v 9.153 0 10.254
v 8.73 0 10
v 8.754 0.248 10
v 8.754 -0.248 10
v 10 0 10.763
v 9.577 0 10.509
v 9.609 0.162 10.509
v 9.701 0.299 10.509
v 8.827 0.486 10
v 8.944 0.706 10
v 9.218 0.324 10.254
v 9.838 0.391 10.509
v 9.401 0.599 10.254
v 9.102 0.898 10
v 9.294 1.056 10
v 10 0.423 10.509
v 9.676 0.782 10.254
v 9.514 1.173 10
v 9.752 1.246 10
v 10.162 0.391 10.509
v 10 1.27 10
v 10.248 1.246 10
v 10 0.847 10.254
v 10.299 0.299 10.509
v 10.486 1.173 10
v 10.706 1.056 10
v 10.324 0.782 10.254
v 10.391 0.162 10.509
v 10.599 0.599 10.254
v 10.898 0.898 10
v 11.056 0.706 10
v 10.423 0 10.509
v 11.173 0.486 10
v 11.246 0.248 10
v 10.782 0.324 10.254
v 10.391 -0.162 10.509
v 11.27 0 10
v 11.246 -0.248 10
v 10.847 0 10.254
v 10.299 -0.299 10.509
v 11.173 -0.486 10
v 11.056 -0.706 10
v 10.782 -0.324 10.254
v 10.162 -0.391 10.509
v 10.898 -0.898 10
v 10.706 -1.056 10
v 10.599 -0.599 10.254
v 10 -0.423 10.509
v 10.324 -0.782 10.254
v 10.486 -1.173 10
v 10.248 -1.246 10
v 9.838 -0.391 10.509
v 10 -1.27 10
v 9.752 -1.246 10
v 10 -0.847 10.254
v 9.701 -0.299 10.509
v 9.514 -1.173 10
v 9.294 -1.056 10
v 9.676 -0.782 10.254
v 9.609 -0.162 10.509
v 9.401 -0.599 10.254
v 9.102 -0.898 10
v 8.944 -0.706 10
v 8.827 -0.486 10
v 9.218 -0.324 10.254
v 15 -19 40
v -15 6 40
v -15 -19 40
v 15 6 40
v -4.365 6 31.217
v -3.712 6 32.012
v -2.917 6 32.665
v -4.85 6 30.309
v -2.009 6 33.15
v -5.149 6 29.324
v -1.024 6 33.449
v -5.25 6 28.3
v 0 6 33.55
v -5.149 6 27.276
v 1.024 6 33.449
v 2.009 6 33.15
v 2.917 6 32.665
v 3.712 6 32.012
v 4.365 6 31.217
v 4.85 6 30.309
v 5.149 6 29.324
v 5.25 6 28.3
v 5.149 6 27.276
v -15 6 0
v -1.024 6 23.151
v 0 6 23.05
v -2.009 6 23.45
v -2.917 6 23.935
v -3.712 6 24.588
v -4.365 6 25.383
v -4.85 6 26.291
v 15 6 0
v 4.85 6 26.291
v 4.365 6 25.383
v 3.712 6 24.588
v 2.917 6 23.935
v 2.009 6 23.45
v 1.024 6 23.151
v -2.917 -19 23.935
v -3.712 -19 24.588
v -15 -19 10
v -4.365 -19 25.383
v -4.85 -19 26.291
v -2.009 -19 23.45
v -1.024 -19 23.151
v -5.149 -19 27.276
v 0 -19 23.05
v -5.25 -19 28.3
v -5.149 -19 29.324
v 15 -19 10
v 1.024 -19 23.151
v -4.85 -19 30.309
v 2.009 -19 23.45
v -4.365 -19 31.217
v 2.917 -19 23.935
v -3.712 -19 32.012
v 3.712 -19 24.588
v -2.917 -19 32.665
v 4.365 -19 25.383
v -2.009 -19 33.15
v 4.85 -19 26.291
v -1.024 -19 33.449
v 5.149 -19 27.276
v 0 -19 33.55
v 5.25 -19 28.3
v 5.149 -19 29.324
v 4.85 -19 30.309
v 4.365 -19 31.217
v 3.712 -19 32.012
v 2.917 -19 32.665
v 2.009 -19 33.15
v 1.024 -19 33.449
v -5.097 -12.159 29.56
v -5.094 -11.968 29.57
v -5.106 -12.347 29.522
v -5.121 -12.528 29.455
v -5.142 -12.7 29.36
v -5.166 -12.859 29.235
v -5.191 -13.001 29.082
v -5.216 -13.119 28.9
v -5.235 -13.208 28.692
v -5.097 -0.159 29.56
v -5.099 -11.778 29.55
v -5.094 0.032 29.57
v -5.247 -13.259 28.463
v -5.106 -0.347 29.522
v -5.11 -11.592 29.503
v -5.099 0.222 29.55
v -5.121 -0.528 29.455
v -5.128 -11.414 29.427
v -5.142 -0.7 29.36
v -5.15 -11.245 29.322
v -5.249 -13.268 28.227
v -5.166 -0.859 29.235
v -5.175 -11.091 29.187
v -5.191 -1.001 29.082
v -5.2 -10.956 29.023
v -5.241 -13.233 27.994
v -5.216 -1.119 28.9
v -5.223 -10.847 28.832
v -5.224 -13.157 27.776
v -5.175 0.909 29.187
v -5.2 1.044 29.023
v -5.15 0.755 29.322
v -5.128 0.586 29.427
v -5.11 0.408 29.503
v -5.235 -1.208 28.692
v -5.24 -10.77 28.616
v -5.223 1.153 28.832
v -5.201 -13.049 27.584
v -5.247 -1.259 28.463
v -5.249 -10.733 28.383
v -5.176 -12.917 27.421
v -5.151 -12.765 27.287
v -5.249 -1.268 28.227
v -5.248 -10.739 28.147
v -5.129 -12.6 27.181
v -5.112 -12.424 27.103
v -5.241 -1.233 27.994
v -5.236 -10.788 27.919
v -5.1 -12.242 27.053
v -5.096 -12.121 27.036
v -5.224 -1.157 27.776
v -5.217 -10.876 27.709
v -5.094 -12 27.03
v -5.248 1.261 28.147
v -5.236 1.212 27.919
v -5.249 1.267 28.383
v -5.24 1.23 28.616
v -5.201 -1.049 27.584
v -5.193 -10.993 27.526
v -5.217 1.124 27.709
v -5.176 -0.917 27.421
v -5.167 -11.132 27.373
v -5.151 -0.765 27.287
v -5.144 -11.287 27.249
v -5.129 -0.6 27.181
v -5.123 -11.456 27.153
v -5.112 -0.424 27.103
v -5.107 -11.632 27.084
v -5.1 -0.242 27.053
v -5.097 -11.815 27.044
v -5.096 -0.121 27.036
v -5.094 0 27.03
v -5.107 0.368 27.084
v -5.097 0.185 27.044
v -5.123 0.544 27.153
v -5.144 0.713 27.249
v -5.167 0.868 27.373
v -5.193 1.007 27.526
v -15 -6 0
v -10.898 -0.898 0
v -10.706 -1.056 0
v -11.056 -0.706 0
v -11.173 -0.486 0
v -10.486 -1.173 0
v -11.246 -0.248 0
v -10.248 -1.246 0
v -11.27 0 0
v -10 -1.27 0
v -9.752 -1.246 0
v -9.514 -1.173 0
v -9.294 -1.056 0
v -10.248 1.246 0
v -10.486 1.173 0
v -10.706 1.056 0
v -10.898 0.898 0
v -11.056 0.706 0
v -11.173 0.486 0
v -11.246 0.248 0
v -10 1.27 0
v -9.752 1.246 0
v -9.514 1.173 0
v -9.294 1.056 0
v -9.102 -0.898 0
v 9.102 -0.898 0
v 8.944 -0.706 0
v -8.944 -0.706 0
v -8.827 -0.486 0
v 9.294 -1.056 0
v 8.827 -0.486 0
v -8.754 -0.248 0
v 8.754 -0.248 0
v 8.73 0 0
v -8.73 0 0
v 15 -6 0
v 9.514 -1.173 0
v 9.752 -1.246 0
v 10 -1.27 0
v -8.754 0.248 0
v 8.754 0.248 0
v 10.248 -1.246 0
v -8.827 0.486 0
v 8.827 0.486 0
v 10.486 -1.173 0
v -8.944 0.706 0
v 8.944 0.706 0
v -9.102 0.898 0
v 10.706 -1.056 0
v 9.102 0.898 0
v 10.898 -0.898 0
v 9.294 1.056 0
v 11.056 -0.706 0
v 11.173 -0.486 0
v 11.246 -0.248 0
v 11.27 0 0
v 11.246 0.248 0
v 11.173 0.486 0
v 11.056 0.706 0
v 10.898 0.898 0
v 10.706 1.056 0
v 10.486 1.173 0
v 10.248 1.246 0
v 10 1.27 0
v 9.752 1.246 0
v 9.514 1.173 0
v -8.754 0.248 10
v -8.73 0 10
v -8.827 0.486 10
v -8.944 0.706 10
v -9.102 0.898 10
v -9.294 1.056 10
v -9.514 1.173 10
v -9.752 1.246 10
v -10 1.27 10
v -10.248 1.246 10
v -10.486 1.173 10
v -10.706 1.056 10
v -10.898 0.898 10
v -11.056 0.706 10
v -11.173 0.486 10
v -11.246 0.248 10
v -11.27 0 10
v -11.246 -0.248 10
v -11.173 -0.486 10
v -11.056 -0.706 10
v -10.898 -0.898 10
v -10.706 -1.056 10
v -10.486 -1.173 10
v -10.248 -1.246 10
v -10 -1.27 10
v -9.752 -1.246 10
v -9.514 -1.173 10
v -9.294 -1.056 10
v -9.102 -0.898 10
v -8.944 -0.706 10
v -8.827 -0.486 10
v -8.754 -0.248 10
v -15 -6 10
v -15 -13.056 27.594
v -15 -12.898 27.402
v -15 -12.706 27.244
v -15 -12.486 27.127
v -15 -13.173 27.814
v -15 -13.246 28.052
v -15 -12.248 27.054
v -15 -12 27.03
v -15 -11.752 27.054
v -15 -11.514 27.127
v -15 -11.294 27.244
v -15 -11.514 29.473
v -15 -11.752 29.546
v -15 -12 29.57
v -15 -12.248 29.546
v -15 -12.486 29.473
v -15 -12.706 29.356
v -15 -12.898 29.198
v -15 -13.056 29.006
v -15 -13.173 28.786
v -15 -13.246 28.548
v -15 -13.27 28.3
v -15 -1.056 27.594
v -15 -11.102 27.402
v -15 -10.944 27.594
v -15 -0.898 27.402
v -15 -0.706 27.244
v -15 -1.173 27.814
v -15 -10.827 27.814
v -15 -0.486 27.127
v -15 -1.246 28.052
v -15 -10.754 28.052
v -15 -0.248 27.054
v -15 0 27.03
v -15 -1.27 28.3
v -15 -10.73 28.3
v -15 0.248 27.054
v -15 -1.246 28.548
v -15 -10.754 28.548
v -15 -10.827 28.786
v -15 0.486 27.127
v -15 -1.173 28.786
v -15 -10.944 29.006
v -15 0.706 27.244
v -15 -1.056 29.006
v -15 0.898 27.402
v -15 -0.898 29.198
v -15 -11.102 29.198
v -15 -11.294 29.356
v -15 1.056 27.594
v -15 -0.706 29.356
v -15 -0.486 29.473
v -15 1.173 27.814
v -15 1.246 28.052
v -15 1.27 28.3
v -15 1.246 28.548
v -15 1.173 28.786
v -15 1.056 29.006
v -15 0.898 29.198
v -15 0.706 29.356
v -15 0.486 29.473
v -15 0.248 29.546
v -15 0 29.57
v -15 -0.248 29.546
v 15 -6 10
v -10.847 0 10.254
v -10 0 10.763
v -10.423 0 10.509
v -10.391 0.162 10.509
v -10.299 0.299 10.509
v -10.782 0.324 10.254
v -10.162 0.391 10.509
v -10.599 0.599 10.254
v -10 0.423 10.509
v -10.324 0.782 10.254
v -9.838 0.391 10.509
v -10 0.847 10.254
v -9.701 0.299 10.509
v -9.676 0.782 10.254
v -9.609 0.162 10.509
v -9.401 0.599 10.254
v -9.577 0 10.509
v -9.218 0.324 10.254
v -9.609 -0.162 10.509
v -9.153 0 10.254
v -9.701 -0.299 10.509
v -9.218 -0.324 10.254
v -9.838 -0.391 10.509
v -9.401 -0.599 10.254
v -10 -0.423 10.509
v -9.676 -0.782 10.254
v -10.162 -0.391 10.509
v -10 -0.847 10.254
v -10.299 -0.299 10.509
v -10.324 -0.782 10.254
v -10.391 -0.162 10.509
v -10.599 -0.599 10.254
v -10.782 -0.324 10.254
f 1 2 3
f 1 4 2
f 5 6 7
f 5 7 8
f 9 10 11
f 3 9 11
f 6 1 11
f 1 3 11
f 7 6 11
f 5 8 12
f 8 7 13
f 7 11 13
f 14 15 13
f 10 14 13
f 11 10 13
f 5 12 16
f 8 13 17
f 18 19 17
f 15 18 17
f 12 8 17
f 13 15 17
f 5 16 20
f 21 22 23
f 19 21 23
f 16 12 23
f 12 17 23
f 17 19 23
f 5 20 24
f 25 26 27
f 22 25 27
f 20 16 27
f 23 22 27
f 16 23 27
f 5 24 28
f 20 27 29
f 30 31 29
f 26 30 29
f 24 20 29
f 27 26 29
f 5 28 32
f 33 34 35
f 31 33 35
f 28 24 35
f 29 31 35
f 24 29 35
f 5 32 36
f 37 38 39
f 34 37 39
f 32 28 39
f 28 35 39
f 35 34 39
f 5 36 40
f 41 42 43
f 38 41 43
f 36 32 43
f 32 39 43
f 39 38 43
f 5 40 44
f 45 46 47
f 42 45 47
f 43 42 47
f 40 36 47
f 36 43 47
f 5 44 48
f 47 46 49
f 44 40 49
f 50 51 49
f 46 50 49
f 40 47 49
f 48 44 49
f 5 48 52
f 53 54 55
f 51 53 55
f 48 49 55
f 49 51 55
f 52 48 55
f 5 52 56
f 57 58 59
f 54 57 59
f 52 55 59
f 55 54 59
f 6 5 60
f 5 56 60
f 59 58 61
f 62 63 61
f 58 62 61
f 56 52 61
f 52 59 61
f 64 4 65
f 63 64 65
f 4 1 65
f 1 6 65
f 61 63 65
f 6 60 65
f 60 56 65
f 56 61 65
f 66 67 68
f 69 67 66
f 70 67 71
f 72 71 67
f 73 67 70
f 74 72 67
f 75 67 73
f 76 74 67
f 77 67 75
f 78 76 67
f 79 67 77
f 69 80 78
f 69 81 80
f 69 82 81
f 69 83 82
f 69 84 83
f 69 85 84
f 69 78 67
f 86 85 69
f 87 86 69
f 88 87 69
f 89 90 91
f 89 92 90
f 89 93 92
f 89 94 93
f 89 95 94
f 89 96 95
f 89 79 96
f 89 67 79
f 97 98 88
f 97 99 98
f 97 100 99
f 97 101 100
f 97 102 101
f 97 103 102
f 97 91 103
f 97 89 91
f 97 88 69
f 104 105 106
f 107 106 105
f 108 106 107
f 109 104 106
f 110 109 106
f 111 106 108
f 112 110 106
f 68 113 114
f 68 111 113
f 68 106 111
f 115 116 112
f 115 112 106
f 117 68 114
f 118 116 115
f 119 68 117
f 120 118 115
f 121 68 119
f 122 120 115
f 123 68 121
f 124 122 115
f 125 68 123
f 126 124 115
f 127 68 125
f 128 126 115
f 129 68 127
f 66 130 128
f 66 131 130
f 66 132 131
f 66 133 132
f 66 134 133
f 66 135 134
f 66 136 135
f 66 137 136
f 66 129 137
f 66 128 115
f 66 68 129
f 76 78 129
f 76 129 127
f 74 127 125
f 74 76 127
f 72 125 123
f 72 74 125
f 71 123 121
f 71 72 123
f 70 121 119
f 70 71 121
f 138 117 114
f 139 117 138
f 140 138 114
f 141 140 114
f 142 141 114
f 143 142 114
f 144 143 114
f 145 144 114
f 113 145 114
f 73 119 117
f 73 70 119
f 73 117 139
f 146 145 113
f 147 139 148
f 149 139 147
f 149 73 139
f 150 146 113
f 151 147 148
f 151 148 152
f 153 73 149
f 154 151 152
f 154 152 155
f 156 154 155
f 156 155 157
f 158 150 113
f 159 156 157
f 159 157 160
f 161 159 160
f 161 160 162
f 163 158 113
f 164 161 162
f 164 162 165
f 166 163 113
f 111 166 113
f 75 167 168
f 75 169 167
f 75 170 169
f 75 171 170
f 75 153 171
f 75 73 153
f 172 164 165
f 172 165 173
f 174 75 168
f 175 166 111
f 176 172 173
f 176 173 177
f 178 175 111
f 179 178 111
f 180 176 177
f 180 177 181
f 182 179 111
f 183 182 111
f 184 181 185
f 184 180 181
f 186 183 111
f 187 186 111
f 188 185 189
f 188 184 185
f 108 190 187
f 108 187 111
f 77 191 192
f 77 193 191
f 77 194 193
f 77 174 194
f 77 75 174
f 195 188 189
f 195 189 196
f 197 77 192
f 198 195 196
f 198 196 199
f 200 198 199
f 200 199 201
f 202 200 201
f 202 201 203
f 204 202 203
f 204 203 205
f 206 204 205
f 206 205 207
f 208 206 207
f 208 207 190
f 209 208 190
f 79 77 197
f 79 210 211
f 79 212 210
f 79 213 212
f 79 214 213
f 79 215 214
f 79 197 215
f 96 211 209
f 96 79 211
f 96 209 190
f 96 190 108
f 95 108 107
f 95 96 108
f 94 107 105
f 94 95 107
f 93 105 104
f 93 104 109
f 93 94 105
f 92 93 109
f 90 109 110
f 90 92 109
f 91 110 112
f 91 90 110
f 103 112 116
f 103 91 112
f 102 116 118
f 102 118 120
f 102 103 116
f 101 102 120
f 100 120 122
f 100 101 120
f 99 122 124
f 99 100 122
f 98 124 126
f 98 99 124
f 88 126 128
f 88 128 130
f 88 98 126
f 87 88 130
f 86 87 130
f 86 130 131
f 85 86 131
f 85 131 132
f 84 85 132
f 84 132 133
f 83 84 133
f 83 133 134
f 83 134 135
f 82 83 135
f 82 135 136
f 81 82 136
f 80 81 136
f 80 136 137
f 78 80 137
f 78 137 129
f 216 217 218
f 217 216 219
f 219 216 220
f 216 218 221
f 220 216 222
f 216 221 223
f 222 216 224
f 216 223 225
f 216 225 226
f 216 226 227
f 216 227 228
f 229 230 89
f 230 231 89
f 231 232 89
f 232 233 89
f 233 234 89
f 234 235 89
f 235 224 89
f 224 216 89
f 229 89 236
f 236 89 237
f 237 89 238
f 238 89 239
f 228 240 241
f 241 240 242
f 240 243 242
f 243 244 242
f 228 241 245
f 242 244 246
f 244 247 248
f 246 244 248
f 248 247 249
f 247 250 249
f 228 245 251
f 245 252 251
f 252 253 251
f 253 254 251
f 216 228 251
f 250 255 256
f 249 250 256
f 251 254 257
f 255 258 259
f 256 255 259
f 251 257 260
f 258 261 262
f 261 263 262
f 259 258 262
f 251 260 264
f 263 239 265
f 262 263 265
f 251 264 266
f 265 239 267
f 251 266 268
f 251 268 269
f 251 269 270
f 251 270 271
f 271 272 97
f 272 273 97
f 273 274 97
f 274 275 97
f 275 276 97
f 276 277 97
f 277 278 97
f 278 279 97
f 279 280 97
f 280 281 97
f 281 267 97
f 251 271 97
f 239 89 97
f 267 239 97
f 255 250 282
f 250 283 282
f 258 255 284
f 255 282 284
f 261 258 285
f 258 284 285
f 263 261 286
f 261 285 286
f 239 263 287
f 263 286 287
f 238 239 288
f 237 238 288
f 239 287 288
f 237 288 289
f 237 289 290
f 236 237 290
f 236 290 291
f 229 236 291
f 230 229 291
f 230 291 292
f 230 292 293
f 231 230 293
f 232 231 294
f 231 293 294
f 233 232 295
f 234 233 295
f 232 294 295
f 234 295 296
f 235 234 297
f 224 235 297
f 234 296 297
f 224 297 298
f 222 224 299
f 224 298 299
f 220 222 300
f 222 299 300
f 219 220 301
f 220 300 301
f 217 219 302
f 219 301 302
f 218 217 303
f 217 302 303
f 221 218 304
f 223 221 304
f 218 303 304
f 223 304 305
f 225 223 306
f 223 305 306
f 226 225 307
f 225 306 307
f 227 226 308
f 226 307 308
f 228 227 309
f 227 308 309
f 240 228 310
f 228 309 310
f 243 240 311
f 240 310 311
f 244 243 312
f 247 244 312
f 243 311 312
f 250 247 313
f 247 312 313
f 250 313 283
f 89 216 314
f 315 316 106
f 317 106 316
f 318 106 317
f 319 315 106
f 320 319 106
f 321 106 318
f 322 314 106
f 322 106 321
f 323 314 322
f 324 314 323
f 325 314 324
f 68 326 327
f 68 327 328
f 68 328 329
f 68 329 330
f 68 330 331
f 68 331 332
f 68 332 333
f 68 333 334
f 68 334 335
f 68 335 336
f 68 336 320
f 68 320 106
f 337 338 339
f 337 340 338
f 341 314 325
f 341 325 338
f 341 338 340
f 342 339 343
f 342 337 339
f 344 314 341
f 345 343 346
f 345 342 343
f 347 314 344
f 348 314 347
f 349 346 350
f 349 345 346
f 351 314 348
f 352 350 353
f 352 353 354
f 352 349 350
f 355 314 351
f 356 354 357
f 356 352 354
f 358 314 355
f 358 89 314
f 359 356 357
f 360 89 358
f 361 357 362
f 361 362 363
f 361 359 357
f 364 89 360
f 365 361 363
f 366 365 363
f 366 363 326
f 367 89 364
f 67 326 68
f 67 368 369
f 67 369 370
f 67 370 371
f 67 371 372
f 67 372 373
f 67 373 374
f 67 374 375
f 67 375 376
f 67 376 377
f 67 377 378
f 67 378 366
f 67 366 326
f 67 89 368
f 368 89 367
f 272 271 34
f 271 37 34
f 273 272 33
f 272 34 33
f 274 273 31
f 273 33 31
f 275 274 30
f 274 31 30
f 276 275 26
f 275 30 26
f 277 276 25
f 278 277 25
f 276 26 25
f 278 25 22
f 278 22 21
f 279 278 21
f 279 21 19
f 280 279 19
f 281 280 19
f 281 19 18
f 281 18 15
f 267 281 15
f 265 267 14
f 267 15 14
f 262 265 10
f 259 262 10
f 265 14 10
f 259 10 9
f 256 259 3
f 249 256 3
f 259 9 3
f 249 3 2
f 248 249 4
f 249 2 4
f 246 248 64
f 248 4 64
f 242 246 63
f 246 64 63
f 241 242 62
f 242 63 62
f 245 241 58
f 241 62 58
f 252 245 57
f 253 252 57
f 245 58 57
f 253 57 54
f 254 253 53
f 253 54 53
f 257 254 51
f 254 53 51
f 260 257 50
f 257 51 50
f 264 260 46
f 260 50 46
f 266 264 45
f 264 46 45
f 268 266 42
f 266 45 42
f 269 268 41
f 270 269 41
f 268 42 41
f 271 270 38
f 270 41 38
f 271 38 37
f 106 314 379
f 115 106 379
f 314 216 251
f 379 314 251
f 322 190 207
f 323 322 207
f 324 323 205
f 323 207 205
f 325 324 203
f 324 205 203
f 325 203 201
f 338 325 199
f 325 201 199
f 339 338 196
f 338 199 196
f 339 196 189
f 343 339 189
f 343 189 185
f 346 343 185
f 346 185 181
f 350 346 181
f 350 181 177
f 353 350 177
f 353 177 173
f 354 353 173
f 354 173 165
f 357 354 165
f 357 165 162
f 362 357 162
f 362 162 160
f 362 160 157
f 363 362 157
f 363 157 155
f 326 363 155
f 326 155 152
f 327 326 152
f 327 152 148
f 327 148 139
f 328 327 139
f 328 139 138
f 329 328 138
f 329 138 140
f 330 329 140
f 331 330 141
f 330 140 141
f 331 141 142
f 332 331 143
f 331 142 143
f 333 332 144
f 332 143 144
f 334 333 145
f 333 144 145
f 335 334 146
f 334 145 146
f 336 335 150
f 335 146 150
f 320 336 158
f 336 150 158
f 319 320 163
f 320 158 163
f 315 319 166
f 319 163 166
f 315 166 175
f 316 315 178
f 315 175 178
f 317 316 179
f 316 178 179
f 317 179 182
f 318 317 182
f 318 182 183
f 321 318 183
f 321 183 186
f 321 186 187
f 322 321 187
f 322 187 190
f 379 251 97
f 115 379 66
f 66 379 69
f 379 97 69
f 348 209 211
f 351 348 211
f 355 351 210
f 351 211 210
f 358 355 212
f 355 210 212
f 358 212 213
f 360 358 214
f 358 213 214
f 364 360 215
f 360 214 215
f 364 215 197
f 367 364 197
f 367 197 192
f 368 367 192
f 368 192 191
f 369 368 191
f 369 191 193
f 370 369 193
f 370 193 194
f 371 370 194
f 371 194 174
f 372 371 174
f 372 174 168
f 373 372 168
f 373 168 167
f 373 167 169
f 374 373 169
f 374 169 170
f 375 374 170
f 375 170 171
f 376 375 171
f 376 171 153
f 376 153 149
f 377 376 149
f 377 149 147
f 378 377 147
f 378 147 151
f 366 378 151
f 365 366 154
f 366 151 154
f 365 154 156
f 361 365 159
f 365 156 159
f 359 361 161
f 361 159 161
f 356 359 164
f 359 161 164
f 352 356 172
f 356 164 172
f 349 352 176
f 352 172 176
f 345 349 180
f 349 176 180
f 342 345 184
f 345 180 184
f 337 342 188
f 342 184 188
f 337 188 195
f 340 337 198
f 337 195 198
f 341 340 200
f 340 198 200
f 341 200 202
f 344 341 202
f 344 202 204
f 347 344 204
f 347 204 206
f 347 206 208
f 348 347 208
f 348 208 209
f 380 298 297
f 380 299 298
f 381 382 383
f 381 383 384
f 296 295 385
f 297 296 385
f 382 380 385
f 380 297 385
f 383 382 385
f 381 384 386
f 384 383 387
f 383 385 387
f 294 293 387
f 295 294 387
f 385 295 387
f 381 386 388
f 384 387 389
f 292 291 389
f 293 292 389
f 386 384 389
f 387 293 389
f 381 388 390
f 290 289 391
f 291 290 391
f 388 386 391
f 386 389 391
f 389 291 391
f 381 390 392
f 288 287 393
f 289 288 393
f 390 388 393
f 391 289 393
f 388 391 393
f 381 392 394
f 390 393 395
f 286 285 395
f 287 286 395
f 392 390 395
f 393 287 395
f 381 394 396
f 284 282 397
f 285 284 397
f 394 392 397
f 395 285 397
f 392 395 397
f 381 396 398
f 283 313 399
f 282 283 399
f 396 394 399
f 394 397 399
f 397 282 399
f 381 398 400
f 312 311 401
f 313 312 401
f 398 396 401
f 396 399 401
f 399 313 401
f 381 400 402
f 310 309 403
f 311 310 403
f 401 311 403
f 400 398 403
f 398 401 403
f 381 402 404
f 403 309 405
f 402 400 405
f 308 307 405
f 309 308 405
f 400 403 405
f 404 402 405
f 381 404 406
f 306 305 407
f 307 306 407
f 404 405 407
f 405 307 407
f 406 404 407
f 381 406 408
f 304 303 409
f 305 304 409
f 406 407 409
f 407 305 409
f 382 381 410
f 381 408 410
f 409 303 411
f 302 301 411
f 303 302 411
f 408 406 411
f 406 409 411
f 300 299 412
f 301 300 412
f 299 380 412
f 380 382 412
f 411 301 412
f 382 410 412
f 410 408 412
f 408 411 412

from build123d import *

# Parameters (mm, degrees)
SKETCH1_W                 = 30
SKETCH1_H                 = 12
BOSS_EXTRUDE1_DEPTH       = 40
SKETCH2_R                 = 5.25
CUT_EXTRUDE1_DEPTH        = 45.373415465
F_8_32_TAPPED_HOLE1_D     = 2.54
F_8_32_TAPPED_HOLE1_DEPTH = 10
F_8_32_TAPPED_HOLE1_TIP   = 0.763092986
SKETCH10_W                = 30
SKETCH10_H                = 30
SKETCH10_R                = 5.25
BOSS_EXTRUDE2_DEPTH       = 13
F_8_32_TAPPED_HOLE2_D     = 2.54
F_8_32_TAPPED_HOLE2_DEPTH = 10.71
F_8_32_TAPPED_HOLE2_TIP   = 0.763092986


with BuildPart() as part:
    # Sketch1 → Boss-Extrude1 (new body)
    with BuildSketch(Plane.XY):
        Rectangle(SKETCH1_W, SKETCH1_H)
    extrude(amount=BOSS_EXTRUDE1_DEPTH)

    # Sketch2 → Cut-Extrude1 (cut, through all)
    with BuildSketch(Plane(origin=(0, 6, 0), x_dir=(1, 0, 0), z_dir=(0, 1, 0))):
        with Locations(Location((0, -28.3, 0), (0, 0, 270))):
            Circle(SKETCH2_R)
    extrude(amount=-CUT_EXTRUDE1_DEPTH, mode=Mode.SUBTRACT)

    # #8-32 Tapped Hole1
    with Locations(Plane(origin=(0, 0, 0), x_dir=(-1, 0, 0), z_dir=(0, 0, -1))):
        with Locations((10, 0), (-10, 0)):
            Hole(F_8_32_TAPPED_HOLE1_D / 2, depth=F_8_32_TAPPED_HOLE1_DEPTH)
            with Locations((0, 0, -(F_8_32_TAPPED_HOLE1_DEPTH + F_8_32_TAPPED_HOLE1_TIP / 2))):  # 118° drill point
                Cone(0, F_8_32_TAPPED_HOLE1_D / 2, F_8_32_TAPPED_HOLE1_TIP, mode=Mode.SUBTRACT)

    # Sketch10 → Boss-Extrude2 (add)
    with BuildSketch(Plane.XZ.offset(6)):
        with Locations((0, 25)):
            Rectangle(SKETCH10_W, SKETCH10_H)
        with Locations(Location((0, 28.3, 0), (0, 0, 90))):
            Circle(SKETCH10_R, mode=Mode.SUBTRACT)
    extrude(amount=BOSS_EXTRUDE2_DEPTH)

    # #8-32 Tapped Hole2
    with Locations(Plane.ZY.offset(15)):
        with Locations((28.3, 0), (28.3, -12)):
            Hole(F_8_32_TAPPED_HOLE2_D / 2, depth=F_8_32_TAPPED_HOLE2_DEPTH)
            with Locations((0, 0, -(F_8_32_TAPPED_HOLE2_DEPTH + F_8_32_TAPPED_HOLE2_TIP / 2))):  # 118° drill point
                Cone(0, F_8_32_TAPPED_HOLE2_D / 2, F_8_32_TAPPED_HOLE2_TIP, mode=Mode.SUBTRACT)


solid = part.part
